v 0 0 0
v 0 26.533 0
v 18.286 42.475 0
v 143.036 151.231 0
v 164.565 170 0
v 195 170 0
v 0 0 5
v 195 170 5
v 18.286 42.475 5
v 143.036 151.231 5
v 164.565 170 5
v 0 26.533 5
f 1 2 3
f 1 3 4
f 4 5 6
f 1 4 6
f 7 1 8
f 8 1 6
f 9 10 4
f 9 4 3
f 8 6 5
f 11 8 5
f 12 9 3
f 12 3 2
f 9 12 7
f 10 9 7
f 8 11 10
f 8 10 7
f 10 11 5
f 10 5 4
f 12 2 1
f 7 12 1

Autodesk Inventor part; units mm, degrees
ref_plane "YZ Plane" through (0, 0, 0) normal (1, 0, 0) x (0, 1, 0)
ref_plane "XZ Plane" through (0, 0, 0) normal (0, 1, 0) x (-1, 0, 0)
ref_plane "XY Plane" through (0, 0, 0) normal (0, 0, 1) x (1, 0, 0)
sketch "スケッチ1" plane through (0, 0, 0) normal (0, 0, 1) x (1, 0, 0)
  line L0 (0, 0) -> (195, 0)
  line L1 (195, 0) -> (195, 170)
  line L2 (195, 170) -> (0, 170)
  line L3 (0, 170) -> (0, 0)
  line L4 (0, 0) -> (195, 170)
  dimension "d0" = 195
  dimension "d1" = 170
extrude "押し出し1" add sketch "スケッチ1" along normal blind 5 contours L3 L2 L4
sketch "スケッチ13" plane through (0, 0, 5) normal (0, 0, 1) x (1, 0, 0)
  line L0 (0, 0) -> (195, 170) projected
  line L1 (0, 0) -> (195, 170)
  line L2 (0, 0) -> (195, 170) projected
  line L3 (195, 170) -> (0, 170) projected
  line L4 (0, 170) -> (0, 0) projected
  line L5 (169.9396, 174.6857) -> (-13.756, 14.5408)
  line L6 (10, 160) -> (168.3118, 160)
  line L7 (168.3118, 160) -> (10, 21.9845)
  line L8 (10, 21.9845) -> (10, 160)
  point P0 (0, 26.5332)
  point P1 (164.5649, 170)
  point P2 (10, 35.2511)
  point P3 (153.0943, 160)
  dimension "d75" = 20
  dimension "d78" = 10
extrude "押し出し11" cut sketch "スケッチ13" against normal blind 10 contours L8 L6 L5
fillet "フィレット7" radius 5 3 edges at (10, 160, 2.5) (10, 35.2511, 2.5) (153.0943, 160, 2.5)
sketch "スケッチ14" plane through (0, 0, 5) normal (0, 0, 1) x (1, 0, 0)
  line L0 (15, 160) -> (139.7502, 160) projected
  arc A0 (143.0359, 151.2311) -> (139.7502, 160) centre (139.7502, 155) ccw projected
  line L1 (143.0359, 151.2311) -> (18.2857, 42.4746) projected
  arc A1 (10, 46.2434) -> (18.2857, 42.4746) centre (15, 46.2434) ccw projected
  line L2 (10, 46.2434) -> (10, 155) projected
  arc A2 (15, 160) -> (10, 155) centre (15, 155) ccw projected
  line L3 (0, 0) -> (195, 170) projected
  line L4 (195, 170) -> (0, 170) projected
  line L5 (0, 170) -> (0, 0) projected
  line L6 (164.5649, 170) -> (-7.7035, 19.8173)
  point P0 (143.0359, 151.2311)
  point P1 (0, 26.5332)
  point P2 (18.2857, 42.4746)
  dimension "d80" = 20
extrude "押し出し12" cut sketch "スケッチ14" against normal blind 10 contours A2 L2 A1 L6 L5 L4 A0 L0
properties part number "RP_Waist-Diagonal-material" material "A5052"
